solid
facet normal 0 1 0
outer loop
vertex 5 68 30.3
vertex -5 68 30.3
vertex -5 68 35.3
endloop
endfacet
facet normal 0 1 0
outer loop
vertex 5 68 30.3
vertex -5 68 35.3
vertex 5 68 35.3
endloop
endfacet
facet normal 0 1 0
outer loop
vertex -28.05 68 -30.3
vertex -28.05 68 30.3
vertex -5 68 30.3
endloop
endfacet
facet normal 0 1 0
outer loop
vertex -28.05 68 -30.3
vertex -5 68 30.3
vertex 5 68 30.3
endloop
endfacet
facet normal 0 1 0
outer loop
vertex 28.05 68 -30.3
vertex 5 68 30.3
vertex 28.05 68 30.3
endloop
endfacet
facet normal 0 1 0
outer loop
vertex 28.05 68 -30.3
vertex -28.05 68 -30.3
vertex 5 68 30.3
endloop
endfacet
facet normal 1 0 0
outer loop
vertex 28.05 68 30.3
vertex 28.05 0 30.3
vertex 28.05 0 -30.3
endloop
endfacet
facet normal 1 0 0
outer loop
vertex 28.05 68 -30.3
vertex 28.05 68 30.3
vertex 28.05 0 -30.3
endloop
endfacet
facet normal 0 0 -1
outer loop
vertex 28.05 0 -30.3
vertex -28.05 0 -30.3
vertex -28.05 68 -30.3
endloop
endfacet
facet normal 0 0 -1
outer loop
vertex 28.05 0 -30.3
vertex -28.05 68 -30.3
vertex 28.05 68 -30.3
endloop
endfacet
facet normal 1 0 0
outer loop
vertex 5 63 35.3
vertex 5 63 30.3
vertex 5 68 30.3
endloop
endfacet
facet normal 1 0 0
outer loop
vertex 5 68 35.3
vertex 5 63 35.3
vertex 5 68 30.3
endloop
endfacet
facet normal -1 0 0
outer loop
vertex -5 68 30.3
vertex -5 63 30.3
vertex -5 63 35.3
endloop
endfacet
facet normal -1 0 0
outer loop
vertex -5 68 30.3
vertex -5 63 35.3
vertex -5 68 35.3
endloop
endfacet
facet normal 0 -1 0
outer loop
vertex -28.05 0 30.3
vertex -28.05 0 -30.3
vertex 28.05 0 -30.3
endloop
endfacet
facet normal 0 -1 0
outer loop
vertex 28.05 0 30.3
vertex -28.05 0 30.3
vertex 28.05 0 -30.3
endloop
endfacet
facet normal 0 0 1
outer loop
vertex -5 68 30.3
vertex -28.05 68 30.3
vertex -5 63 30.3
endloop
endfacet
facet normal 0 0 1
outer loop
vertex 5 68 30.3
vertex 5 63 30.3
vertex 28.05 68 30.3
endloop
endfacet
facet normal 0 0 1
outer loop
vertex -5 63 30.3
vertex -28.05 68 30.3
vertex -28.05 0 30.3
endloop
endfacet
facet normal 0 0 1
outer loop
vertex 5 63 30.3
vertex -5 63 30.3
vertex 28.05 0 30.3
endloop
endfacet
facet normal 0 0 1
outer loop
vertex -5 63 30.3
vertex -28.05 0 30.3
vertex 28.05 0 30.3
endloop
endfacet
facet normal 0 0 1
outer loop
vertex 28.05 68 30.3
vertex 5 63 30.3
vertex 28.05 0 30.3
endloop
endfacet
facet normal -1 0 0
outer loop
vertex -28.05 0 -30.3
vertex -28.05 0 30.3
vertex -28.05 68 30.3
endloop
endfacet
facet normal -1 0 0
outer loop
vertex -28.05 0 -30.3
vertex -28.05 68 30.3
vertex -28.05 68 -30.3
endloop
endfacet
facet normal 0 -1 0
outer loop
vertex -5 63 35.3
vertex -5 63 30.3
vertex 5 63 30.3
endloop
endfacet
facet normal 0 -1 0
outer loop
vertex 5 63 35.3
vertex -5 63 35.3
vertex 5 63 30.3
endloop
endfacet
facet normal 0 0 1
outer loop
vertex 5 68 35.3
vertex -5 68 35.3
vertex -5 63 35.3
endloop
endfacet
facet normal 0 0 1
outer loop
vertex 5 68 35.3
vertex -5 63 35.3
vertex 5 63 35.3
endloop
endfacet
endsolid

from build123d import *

# Parameters (mm, degrees)
SKETCH_1_W      = 56.1
SKETCH_1_H      = 60.6
EXTRUDE_1_DEPTH = 68
SKETCH_2_W      = 5
SKETCH_2_H      = 5
EXTRUDE_2_DEPTH = 5


with BuildPart() as part:
    # 草图1 → 凸台-拉伸1 (new body)
    with BuildSketch(Plane(origin=(0, 0, 0), x_dir=(1, 0, 0), z_dir=(0, 1, 0))):
        Rectangle(SKETCH_1_W, SKETCH_1_H)
    extrude(amount=EXTRUDE_1_DEPTH)

    # 草图2 → 凸台-拉伸2 (add)
    with BuildSketch(Plane.XY.offset(30.3)):
        with Locations((-2.5, 65.5)):
            Rectangle(SKETCH_2_W, SKETCH_2_H)
        with Locations((2.5, 65.5)):
            Rectangle(SKETCH_2_W, SKETCH_2_H)
    extrude(amount=EXTRUDE_2_DEPTH)


solid = part.part
